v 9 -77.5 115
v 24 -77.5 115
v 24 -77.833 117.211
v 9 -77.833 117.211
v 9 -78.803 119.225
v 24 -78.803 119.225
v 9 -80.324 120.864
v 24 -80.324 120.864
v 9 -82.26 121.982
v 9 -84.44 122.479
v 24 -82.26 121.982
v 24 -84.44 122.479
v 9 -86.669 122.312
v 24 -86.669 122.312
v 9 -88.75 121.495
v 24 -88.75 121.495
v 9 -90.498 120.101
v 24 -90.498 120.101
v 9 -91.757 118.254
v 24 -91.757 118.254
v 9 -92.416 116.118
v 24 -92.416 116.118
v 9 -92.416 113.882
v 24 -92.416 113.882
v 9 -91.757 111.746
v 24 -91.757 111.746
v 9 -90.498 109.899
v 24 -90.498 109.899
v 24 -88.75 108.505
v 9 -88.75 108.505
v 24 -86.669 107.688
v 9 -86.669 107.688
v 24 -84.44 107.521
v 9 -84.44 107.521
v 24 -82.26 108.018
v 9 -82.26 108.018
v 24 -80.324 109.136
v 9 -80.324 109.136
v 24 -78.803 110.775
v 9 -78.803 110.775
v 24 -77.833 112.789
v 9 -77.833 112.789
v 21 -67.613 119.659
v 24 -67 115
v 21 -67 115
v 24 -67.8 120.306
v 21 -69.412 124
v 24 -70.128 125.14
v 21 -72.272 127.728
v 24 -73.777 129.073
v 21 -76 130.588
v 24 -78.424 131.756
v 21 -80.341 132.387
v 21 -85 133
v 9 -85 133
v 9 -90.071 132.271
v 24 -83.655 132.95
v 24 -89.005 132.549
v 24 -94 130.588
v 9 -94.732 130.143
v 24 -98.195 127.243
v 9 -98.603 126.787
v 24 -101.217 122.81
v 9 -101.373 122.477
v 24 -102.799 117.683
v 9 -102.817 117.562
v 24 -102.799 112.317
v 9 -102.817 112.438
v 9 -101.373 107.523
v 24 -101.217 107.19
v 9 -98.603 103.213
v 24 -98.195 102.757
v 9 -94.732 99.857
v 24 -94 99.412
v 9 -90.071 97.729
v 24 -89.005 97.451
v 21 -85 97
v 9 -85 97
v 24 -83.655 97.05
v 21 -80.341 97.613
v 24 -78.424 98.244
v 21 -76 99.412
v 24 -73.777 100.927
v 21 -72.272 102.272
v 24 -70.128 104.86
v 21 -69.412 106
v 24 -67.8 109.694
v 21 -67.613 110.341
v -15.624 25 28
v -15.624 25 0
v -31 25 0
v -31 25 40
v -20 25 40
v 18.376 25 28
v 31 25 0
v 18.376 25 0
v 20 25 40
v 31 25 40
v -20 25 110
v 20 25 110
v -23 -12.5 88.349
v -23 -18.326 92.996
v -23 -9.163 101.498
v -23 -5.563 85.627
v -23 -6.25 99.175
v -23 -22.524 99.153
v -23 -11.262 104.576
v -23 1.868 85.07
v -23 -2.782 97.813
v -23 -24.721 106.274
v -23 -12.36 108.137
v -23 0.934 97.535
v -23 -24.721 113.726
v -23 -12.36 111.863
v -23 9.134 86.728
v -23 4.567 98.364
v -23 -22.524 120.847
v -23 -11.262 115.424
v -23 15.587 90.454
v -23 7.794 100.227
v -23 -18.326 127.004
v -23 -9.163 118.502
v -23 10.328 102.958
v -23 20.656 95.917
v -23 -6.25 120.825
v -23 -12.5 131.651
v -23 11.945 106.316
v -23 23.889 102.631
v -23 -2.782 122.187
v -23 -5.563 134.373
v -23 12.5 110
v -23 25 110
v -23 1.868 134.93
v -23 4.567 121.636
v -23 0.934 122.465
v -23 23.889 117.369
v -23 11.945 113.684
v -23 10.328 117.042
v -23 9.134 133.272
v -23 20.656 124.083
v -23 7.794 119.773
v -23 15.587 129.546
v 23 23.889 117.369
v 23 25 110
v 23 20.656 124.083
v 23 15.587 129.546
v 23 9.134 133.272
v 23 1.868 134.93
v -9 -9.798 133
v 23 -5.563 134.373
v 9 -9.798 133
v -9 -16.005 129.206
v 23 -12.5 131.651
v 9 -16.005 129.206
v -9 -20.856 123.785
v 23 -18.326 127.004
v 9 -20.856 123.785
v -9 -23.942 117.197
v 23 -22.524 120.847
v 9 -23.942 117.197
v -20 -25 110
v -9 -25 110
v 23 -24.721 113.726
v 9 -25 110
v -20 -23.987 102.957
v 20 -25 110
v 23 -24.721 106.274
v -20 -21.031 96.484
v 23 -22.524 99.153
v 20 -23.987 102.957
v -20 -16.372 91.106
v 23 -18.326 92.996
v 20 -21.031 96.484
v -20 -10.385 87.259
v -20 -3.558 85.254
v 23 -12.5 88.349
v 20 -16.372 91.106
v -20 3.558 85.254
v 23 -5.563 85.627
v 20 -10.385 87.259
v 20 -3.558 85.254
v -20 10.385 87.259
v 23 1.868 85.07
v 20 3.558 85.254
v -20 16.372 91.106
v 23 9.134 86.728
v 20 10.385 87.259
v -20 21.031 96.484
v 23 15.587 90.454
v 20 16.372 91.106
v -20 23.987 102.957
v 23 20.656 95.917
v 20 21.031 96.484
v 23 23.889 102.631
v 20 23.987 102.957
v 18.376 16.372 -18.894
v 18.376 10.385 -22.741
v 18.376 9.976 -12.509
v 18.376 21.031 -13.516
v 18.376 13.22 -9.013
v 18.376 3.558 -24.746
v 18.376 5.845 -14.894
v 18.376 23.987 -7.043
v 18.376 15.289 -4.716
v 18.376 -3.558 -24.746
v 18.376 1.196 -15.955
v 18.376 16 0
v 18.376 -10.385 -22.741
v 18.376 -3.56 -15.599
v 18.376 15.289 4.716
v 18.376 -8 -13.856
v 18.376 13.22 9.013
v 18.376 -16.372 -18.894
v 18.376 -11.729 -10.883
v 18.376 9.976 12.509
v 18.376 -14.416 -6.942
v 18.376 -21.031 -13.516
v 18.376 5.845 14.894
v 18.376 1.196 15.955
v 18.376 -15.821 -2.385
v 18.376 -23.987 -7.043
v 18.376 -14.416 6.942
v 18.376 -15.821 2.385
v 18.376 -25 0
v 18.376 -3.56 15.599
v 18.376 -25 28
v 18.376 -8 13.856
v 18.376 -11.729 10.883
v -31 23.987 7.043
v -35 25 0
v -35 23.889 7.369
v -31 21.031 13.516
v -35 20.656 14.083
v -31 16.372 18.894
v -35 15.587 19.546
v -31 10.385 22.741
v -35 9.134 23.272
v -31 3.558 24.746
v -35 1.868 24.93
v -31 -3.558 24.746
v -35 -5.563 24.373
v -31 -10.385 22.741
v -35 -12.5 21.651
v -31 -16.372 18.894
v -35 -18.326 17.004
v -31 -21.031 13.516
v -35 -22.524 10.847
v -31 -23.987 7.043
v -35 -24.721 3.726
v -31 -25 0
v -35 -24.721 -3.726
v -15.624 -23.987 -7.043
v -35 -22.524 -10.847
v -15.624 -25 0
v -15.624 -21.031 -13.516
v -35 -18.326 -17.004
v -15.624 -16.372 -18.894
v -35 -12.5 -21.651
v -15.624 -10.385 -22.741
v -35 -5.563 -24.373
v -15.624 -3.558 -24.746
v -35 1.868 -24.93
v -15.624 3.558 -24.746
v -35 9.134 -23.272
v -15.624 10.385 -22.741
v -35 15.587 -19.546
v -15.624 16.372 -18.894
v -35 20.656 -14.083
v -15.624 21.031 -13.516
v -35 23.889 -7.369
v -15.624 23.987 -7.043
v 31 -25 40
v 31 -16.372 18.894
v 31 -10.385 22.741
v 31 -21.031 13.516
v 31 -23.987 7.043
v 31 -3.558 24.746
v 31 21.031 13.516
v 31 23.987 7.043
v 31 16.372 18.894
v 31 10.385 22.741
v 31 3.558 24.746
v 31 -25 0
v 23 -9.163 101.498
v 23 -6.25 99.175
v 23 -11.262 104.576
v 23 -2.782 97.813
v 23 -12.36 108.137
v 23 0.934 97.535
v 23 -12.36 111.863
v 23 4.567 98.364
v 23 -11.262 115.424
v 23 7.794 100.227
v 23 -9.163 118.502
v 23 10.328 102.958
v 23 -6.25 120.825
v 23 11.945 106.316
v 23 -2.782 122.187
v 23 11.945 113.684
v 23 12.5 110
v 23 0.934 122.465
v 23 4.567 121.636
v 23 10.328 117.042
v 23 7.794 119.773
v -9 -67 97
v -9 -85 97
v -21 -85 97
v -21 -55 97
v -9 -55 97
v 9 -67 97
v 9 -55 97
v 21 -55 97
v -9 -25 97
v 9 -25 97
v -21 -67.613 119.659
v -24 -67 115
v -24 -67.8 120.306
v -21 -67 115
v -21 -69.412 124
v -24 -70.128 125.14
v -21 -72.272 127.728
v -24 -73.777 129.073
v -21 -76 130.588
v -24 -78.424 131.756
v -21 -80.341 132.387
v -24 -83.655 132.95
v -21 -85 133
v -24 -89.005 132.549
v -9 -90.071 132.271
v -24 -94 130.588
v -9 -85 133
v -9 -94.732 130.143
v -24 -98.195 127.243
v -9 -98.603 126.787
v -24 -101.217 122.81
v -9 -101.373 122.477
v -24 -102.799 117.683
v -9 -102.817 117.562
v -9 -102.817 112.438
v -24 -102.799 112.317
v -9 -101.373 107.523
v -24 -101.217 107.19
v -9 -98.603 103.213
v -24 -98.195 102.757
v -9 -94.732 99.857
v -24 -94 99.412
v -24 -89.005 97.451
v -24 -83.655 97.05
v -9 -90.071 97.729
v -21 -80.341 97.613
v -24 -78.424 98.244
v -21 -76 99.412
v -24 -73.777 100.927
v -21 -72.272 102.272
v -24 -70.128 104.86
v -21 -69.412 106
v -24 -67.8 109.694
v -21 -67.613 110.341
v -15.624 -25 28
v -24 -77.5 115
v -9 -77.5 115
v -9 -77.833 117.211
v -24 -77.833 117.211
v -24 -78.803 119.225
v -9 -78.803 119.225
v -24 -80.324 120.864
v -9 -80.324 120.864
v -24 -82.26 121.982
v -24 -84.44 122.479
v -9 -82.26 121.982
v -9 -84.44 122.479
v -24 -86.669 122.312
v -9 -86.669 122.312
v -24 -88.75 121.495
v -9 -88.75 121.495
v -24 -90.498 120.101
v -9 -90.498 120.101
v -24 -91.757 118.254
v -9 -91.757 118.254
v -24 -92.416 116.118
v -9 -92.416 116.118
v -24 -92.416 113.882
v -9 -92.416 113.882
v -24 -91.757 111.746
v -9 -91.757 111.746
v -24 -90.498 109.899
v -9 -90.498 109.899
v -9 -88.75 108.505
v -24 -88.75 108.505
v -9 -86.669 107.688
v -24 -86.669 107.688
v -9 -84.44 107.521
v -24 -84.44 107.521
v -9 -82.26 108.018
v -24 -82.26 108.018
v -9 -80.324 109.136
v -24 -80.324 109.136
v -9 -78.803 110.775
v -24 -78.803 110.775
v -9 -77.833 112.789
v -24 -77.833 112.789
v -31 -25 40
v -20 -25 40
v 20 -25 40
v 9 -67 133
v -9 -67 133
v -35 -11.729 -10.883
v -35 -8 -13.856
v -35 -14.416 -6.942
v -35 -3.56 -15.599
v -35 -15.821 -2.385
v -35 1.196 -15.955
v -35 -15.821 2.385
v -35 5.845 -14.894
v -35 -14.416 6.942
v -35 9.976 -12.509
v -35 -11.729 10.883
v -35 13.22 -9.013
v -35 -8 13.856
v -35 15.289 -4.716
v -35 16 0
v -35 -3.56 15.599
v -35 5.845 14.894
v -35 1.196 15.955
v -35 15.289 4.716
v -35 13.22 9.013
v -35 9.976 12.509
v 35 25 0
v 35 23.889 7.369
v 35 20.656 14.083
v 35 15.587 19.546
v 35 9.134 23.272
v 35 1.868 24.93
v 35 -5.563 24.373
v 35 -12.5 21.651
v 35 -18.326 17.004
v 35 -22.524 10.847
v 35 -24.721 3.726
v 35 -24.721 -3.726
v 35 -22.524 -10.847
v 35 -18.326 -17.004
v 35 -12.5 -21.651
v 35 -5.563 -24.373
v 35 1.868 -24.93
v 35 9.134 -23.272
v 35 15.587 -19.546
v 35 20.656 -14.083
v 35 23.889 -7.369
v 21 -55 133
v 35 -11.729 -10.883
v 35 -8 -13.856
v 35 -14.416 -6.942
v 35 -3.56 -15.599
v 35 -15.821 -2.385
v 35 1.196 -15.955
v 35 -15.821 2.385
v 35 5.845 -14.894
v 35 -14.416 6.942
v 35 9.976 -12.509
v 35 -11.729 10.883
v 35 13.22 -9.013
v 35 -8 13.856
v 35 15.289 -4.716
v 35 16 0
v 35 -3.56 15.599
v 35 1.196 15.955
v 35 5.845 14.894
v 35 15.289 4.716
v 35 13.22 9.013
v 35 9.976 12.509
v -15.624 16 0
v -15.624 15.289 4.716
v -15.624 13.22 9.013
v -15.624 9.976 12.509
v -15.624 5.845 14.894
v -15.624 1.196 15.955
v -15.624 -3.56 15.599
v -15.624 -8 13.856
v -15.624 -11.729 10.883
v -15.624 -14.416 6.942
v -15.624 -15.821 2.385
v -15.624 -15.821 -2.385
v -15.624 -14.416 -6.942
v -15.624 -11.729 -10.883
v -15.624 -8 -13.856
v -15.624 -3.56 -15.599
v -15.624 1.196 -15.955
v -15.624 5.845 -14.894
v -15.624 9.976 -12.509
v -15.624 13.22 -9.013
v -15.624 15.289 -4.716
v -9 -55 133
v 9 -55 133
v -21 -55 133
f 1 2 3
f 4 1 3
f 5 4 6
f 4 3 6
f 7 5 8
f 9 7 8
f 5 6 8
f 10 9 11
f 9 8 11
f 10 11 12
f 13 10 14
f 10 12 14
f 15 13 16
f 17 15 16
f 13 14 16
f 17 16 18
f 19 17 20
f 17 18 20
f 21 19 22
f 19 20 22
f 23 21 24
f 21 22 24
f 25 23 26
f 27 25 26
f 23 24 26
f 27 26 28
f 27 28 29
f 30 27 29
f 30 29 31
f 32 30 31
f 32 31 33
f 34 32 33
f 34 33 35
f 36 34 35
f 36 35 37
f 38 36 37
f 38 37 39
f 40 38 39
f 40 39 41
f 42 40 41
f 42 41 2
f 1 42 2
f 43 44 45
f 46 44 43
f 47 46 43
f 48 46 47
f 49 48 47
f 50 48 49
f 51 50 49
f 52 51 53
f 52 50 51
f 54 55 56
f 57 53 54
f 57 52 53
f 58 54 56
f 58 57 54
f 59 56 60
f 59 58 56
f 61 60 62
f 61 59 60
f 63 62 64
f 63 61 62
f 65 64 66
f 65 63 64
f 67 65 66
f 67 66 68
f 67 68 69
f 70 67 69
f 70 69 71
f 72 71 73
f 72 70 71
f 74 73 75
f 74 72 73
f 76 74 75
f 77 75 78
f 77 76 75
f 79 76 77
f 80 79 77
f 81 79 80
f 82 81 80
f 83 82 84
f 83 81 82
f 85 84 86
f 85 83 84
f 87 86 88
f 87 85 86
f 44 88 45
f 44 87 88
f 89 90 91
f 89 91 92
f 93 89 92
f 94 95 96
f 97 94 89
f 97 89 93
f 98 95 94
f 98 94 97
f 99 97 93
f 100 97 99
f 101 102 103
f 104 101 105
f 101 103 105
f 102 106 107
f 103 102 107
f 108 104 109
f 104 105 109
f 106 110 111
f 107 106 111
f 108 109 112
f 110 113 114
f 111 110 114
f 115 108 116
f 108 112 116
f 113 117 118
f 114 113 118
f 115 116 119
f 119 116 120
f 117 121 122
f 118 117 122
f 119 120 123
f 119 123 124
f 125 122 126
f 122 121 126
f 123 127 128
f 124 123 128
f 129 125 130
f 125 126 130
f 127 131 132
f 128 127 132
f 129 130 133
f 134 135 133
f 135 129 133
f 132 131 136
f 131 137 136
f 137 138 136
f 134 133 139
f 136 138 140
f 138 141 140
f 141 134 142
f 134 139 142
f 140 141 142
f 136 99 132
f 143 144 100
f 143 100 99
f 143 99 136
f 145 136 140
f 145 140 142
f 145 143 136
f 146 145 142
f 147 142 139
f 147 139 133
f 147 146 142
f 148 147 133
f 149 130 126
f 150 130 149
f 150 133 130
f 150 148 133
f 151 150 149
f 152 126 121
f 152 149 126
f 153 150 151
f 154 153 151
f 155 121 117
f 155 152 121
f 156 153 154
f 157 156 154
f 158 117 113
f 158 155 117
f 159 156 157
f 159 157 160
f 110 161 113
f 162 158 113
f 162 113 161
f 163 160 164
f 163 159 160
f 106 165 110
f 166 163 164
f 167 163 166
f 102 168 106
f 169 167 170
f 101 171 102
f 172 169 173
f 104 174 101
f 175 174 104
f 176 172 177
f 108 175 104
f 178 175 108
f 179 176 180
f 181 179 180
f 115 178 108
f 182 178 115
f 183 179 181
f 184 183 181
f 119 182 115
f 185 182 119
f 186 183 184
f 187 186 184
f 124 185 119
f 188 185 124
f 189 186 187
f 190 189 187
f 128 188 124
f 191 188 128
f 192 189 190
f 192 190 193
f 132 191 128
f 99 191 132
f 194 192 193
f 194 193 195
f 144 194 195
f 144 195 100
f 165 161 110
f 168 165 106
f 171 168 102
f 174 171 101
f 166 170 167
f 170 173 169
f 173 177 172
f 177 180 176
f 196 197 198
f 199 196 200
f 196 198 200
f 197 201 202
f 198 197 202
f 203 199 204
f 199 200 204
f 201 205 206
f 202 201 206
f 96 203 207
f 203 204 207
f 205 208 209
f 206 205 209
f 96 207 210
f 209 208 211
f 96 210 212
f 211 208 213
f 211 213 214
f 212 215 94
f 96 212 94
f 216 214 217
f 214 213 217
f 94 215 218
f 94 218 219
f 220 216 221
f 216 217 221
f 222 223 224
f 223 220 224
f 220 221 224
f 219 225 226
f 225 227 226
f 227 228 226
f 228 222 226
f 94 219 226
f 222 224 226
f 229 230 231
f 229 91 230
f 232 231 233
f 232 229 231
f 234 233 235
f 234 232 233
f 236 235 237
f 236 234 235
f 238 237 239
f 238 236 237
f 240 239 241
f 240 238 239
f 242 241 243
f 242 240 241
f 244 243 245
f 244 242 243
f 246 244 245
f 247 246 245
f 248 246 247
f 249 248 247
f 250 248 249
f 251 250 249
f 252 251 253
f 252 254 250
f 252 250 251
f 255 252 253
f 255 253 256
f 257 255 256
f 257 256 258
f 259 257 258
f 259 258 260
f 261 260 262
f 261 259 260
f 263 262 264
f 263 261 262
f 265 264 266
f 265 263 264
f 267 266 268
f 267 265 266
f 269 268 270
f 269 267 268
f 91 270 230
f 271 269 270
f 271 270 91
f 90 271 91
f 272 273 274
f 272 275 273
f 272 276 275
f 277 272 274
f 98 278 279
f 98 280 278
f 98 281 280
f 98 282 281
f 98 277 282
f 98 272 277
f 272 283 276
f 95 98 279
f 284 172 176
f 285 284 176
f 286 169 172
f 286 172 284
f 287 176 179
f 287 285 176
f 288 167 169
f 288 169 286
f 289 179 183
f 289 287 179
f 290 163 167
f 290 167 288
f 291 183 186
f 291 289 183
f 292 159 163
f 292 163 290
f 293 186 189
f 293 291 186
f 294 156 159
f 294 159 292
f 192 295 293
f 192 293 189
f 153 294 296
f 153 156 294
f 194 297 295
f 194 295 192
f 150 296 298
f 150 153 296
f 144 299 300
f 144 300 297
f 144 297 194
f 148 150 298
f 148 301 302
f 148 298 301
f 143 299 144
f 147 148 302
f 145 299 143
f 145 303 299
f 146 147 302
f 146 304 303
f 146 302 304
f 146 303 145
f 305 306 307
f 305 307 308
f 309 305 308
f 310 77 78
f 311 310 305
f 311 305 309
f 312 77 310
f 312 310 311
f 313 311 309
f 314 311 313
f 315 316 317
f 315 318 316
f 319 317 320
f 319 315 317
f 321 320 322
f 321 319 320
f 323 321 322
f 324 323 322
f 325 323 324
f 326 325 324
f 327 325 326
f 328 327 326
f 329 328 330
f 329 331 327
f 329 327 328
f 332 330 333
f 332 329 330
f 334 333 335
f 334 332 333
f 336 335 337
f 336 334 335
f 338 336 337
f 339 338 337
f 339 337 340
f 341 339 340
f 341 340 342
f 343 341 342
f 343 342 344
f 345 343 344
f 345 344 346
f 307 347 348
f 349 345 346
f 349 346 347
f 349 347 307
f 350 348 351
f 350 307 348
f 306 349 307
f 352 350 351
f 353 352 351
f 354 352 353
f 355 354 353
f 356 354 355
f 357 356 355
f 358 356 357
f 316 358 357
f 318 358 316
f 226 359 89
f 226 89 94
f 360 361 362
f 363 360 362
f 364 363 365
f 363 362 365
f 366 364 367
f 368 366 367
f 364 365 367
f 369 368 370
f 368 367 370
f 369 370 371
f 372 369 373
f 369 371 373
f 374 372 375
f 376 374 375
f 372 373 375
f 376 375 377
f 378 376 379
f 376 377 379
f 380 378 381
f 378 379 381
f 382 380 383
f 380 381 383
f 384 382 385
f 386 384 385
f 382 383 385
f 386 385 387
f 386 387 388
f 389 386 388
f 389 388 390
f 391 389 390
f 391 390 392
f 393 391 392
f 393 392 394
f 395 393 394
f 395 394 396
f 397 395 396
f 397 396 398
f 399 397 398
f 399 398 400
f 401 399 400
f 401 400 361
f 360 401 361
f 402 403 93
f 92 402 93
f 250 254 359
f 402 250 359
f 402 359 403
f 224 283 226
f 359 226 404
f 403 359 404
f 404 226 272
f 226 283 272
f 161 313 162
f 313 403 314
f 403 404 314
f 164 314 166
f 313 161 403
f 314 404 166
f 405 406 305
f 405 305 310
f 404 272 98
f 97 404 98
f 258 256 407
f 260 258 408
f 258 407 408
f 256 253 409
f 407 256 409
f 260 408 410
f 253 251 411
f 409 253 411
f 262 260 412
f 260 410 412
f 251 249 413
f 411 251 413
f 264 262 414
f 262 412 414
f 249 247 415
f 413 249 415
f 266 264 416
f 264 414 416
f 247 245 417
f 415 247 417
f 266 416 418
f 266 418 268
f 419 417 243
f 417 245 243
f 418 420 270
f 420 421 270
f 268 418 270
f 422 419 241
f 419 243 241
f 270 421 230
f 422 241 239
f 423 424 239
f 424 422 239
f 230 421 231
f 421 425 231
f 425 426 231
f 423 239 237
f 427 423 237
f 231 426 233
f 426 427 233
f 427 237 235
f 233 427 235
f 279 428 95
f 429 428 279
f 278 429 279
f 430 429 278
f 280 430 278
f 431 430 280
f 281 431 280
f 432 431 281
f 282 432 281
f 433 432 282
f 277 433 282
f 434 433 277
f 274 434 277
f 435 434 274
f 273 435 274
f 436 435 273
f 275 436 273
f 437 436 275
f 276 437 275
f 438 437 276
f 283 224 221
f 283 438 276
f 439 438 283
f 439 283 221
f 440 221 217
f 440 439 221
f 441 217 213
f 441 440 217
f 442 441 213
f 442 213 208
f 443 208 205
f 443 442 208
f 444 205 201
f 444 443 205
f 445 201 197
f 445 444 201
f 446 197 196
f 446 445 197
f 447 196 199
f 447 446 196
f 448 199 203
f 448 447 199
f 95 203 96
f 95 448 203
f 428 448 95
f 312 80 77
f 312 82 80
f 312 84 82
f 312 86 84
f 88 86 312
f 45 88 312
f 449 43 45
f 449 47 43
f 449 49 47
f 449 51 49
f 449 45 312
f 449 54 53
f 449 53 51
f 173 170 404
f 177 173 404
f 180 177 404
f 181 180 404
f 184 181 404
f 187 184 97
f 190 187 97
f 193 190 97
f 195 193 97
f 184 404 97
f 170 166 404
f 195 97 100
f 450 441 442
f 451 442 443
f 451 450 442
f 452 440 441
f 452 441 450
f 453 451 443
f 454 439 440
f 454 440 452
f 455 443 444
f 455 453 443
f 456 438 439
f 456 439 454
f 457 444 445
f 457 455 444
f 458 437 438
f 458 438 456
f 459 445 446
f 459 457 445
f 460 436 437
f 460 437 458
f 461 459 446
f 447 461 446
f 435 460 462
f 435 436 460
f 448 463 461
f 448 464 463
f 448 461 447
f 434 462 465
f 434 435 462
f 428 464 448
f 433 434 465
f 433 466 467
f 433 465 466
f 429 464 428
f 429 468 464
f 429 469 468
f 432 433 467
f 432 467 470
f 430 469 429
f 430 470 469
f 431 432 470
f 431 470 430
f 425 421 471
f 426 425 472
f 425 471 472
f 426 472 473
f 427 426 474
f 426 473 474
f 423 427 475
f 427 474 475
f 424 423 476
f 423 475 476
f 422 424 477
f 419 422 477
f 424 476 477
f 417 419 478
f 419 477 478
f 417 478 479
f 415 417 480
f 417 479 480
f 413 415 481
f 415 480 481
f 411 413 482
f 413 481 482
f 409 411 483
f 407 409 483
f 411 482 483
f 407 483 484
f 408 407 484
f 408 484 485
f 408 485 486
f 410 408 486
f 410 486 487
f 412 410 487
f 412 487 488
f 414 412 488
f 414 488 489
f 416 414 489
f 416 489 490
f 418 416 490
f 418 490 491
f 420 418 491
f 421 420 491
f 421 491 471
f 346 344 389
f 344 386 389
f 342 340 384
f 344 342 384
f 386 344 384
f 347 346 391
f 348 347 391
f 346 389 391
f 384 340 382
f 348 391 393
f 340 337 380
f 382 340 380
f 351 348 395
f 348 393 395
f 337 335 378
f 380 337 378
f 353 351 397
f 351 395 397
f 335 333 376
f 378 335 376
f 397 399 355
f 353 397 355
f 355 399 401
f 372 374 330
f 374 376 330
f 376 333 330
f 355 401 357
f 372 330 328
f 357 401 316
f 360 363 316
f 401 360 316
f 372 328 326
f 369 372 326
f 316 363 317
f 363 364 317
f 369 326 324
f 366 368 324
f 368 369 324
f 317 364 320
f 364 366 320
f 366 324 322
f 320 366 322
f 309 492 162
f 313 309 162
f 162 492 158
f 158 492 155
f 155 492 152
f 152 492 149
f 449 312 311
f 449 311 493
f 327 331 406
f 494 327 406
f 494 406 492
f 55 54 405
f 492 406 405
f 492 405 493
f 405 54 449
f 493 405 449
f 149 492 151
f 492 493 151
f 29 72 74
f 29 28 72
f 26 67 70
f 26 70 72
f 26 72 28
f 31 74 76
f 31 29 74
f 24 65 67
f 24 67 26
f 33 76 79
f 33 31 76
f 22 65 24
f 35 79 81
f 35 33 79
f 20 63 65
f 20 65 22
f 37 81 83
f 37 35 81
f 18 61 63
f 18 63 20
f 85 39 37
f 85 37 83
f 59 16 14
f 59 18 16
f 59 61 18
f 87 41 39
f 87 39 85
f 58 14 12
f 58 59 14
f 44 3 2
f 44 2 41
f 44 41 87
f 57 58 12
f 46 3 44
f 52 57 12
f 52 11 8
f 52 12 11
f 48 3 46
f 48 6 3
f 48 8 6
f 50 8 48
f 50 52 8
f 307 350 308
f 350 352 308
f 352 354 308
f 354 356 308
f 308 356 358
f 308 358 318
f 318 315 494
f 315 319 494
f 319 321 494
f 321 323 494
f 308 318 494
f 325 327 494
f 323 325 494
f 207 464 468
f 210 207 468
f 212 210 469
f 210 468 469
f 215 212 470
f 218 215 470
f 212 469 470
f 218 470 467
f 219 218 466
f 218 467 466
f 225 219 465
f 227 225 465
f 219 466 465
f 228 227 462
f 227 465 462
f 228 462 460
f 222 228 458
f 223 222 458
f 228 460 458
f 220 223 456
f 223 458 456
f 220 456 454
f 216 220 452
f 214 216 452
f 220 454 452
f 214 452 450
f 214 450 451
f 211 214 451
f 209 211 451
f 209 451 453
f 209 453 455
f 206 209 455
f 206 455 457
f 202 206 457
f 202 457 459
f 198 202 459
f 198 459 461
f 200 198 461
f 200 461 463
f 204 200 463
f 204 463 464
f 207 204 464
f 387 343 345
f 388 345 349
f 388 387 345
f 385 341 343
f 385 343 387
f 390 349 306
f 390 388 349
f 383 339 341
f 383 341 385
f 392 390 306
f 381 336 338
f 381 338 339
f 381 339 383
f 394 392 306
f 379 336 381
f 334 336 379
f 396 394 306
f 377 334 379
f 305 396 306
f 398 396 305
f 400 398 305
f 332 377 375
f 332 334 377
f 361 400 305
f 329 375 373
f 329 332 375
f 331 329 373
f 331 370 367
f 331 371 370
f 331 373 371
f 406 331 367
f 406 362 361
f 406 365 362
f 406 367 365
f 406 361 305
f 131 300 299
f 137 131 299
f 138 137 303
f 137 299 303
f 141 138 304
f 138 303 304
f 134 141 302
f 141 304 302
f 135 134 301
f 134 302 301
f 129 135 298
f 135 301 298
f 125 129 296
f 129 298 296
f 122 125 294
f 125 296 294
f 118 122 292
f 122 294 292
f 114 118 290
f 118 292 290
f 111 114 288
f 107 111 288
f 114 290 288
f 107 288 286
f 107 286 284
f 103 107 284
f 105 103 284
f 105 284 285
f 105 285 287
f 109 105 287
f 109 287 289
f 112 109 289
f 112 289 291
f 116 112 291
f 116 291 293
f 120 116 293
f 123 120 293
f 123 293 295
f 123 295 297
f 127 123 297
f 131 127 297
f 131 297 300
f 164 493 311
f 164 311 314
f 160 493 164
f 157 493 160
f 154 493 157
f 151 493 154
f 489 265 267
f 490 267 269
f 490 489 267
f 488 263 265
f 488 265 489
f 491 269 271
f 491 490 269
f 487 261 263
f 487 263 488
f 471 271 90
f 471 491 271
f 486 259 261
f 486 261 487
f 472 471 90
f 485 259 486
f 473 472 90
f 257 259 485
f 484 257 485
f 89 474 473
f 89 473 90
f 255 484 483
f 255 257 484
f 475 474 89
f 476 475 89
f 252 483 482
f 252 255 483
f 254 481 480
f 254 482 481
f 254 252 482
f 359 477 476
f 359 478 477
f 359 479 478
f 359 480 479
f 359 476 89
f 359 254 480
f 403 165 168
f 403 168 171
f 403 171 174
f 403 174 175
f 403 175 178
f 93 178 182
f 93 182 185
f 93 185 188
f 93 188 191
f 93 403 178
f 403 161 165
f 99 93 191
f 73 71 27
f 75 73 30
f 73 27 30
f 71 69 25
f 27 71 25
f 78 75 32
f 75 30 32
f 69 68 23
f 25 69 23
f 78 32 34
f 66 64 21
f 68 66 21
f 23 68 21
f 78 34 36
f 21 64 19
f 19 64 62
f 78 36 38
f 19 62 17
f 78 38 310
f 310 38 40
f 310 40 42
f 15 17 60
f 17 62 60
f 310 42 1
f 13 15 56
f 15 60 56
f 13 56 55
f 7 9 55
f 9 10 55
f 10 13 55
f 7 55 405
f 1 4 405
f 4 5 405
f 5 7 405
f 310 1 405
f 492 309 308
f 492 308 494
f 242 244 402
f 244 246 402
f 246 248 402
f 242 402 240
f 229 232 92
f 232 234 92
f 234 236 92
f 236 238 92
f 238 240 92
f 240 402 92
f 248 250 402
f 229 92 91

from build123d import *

# Parameters (mm, degrees)
SKETCH_R        = 25
PAD_DEPTH       = 35
SKETCH001_W     = 50
SKETCH001_H     = 40
PAD001_DEPTH    = 31
SKETCH002_W     = 34
SKETCH002_H     = 67.560009
POCKET_DEPTH    = 50.001
SKETCH003_R     = 16
POCKET001_DEPTH = 70.001
SKETCH004_W     = 40
SKETCH004_H     = 50
PAD002_DEPTH    = 70
SKETCH005_R     = 25
PAD003_DEPTH    = 23
SKETCH007_W     = 30
SKETCH007_H     = 36
PAD005_DEPTH    = 21
SKETCH006_R     = 18
PAD004_DEPTH    = 24
SKETCH008_W     = 18
SKETCH008_H     = 51.791633
POCKET002_DEPTH = 36.001
SKETCH009_R     = 7.5
POCKET003_DEPTH = 36.001
SKETCH010_W     = 57
SKETCH010_H     = 36
PAD006_DEPTH    = 9
SKETCH011_R     = 12.5
POCKET004_DEPTH = 58.001
SKETCH012_R     = 7.5
POCKET005_DEPTH = 59.001


with BuildPart() as pad:
    # Sketch → Pad (new body, symmetric)
    with BuildSketch(Plane.YZ):
        Circle(SKETCH_R)
    extrude(amount=PAD_DEPTH, both=True)


with BuildPart() as pad002:
    # Sketch001 → Pad001 (new body, symmetric)
    with BuildSketch(Plane.YZ):
        with Locations((0, 20)):
            Rectangle(SKETCH001_W, SKETCH001_H)
    extrude(amount=PAD001_DEPTH, both=True)

    # Fusion: union Pad
    add(pad.part)

    # Sketch002 → Pocket (cut, through all)
    with BuildSketch(Plane.XZ.offset(25)):
        with Locations((1.376189, -5.780005)):
            Rectangle(SKETCH002_W, SKETCH002_H)
    extrude(amount=-POCKET_DEPTH, mode=Mode.SUBTRACT)

    # Sketch003 → Pocket001 (cut, through all)
    with BuildSketch(Plane.YZ.offset(35)):
        Circle(SKETCH003_R)
    extrude(amount=-POCKET001_DEPTH, mode=Mode.SUBTRACT)

    # Sketch004 → Pad002 (new body)
    with BuildSketch(Plane.XY.offset(40)):
        Rectangle(SKETCH004_W, SKETCH004_H)
    extrude(amount=PAD002_DEPTH)


with BuildPart() as fusion003:
    # Sketch005 → Pad003 (new body, symmetric)
    with BuildSketch(Plane.YZ):
        with Locations((0, 110)):
            Circle(SKETCH005_R)
    extrude(amount=PAD003_DEPTH, both=True)

    # Fusion003: union Pad002
    add(pad002.part)


with BuildPart() as pad005:
    # Sketch007 → Pad005 (new body, symmetric)
    with BuildSketch(Plane.YZ):
        with Locations((-70, 115)):
            Rectangle(SKETCH007_W, SKETCH007_H)
    extrude(amount=PAD005_DEPTH, both=True)


with BuildPart() as pocket003:
    # Sketch006 → Pad004 (new body, symmetric)
    with BuildSketch(Plane.YZ):
        with Locations((-85, 115)):
            Circle(SKETCH006_R)
    extrude(amount=PAD004_DEPTH, both=True)

    # Fusion001: union Pad005
    add(pad005.part)

    # Sketch008 → Pocket002 (cut, through all)
    with BuildSketch(Plane.XY.offset(133)):
        with Locations((0, -92.895816)):
            Rectangle(SKETCH008_W, SKETCH008_H)
    extrude(amount=-POCKET002_DEPTH, mode=Mode.SUBTRACT)

    # Sketch009 → Pocket003 (cut, through all)
    with BuildSketch(Plane.XY.offset(133)):
        with Locations((-85, 110)):
            Circle(SKETCH009_R)
    extrude(amount=-POCKET003_DEPTH, mode=Mode.SUBTRACT)


with BuildPart() as pocket005:
    # Sketch010 → Pad006 (new body, symmetric)
    with BuildSketch(Plane.YZ):
        with Locations((-28.5, 115)):
            Rectangle(SKETCH010_W, SKETCH010_H)
    extrude(amount=PAD006_DEPTH, both=True)

    # Fusion002: union Pocket003
    add(pocket003.part)

    # Fusion004: union Fusion003
    add(fusion003.part)

    # Sketch011 → Pocket004 (cut, through all)
    with BuildSketch(Plane.YZ.offset(23)):
        with Locations((0, 110)):
            Circle(SKETCH011_R)
    extrude(amount=-POCKET004_DEPTH, mode=Mode.SUBTRACT)

    # Sketch012 → Pocket005 (cut, through all)
    with BuildSketch(Plane.YZ.offset(24)):
        with Locations((-85, 115)):
            Circle(SKETCH012_R)
    extrude(amount=-POCKET005_DEPTH, mode=Mode.SUBTRACT)


solid = pocket005.part
